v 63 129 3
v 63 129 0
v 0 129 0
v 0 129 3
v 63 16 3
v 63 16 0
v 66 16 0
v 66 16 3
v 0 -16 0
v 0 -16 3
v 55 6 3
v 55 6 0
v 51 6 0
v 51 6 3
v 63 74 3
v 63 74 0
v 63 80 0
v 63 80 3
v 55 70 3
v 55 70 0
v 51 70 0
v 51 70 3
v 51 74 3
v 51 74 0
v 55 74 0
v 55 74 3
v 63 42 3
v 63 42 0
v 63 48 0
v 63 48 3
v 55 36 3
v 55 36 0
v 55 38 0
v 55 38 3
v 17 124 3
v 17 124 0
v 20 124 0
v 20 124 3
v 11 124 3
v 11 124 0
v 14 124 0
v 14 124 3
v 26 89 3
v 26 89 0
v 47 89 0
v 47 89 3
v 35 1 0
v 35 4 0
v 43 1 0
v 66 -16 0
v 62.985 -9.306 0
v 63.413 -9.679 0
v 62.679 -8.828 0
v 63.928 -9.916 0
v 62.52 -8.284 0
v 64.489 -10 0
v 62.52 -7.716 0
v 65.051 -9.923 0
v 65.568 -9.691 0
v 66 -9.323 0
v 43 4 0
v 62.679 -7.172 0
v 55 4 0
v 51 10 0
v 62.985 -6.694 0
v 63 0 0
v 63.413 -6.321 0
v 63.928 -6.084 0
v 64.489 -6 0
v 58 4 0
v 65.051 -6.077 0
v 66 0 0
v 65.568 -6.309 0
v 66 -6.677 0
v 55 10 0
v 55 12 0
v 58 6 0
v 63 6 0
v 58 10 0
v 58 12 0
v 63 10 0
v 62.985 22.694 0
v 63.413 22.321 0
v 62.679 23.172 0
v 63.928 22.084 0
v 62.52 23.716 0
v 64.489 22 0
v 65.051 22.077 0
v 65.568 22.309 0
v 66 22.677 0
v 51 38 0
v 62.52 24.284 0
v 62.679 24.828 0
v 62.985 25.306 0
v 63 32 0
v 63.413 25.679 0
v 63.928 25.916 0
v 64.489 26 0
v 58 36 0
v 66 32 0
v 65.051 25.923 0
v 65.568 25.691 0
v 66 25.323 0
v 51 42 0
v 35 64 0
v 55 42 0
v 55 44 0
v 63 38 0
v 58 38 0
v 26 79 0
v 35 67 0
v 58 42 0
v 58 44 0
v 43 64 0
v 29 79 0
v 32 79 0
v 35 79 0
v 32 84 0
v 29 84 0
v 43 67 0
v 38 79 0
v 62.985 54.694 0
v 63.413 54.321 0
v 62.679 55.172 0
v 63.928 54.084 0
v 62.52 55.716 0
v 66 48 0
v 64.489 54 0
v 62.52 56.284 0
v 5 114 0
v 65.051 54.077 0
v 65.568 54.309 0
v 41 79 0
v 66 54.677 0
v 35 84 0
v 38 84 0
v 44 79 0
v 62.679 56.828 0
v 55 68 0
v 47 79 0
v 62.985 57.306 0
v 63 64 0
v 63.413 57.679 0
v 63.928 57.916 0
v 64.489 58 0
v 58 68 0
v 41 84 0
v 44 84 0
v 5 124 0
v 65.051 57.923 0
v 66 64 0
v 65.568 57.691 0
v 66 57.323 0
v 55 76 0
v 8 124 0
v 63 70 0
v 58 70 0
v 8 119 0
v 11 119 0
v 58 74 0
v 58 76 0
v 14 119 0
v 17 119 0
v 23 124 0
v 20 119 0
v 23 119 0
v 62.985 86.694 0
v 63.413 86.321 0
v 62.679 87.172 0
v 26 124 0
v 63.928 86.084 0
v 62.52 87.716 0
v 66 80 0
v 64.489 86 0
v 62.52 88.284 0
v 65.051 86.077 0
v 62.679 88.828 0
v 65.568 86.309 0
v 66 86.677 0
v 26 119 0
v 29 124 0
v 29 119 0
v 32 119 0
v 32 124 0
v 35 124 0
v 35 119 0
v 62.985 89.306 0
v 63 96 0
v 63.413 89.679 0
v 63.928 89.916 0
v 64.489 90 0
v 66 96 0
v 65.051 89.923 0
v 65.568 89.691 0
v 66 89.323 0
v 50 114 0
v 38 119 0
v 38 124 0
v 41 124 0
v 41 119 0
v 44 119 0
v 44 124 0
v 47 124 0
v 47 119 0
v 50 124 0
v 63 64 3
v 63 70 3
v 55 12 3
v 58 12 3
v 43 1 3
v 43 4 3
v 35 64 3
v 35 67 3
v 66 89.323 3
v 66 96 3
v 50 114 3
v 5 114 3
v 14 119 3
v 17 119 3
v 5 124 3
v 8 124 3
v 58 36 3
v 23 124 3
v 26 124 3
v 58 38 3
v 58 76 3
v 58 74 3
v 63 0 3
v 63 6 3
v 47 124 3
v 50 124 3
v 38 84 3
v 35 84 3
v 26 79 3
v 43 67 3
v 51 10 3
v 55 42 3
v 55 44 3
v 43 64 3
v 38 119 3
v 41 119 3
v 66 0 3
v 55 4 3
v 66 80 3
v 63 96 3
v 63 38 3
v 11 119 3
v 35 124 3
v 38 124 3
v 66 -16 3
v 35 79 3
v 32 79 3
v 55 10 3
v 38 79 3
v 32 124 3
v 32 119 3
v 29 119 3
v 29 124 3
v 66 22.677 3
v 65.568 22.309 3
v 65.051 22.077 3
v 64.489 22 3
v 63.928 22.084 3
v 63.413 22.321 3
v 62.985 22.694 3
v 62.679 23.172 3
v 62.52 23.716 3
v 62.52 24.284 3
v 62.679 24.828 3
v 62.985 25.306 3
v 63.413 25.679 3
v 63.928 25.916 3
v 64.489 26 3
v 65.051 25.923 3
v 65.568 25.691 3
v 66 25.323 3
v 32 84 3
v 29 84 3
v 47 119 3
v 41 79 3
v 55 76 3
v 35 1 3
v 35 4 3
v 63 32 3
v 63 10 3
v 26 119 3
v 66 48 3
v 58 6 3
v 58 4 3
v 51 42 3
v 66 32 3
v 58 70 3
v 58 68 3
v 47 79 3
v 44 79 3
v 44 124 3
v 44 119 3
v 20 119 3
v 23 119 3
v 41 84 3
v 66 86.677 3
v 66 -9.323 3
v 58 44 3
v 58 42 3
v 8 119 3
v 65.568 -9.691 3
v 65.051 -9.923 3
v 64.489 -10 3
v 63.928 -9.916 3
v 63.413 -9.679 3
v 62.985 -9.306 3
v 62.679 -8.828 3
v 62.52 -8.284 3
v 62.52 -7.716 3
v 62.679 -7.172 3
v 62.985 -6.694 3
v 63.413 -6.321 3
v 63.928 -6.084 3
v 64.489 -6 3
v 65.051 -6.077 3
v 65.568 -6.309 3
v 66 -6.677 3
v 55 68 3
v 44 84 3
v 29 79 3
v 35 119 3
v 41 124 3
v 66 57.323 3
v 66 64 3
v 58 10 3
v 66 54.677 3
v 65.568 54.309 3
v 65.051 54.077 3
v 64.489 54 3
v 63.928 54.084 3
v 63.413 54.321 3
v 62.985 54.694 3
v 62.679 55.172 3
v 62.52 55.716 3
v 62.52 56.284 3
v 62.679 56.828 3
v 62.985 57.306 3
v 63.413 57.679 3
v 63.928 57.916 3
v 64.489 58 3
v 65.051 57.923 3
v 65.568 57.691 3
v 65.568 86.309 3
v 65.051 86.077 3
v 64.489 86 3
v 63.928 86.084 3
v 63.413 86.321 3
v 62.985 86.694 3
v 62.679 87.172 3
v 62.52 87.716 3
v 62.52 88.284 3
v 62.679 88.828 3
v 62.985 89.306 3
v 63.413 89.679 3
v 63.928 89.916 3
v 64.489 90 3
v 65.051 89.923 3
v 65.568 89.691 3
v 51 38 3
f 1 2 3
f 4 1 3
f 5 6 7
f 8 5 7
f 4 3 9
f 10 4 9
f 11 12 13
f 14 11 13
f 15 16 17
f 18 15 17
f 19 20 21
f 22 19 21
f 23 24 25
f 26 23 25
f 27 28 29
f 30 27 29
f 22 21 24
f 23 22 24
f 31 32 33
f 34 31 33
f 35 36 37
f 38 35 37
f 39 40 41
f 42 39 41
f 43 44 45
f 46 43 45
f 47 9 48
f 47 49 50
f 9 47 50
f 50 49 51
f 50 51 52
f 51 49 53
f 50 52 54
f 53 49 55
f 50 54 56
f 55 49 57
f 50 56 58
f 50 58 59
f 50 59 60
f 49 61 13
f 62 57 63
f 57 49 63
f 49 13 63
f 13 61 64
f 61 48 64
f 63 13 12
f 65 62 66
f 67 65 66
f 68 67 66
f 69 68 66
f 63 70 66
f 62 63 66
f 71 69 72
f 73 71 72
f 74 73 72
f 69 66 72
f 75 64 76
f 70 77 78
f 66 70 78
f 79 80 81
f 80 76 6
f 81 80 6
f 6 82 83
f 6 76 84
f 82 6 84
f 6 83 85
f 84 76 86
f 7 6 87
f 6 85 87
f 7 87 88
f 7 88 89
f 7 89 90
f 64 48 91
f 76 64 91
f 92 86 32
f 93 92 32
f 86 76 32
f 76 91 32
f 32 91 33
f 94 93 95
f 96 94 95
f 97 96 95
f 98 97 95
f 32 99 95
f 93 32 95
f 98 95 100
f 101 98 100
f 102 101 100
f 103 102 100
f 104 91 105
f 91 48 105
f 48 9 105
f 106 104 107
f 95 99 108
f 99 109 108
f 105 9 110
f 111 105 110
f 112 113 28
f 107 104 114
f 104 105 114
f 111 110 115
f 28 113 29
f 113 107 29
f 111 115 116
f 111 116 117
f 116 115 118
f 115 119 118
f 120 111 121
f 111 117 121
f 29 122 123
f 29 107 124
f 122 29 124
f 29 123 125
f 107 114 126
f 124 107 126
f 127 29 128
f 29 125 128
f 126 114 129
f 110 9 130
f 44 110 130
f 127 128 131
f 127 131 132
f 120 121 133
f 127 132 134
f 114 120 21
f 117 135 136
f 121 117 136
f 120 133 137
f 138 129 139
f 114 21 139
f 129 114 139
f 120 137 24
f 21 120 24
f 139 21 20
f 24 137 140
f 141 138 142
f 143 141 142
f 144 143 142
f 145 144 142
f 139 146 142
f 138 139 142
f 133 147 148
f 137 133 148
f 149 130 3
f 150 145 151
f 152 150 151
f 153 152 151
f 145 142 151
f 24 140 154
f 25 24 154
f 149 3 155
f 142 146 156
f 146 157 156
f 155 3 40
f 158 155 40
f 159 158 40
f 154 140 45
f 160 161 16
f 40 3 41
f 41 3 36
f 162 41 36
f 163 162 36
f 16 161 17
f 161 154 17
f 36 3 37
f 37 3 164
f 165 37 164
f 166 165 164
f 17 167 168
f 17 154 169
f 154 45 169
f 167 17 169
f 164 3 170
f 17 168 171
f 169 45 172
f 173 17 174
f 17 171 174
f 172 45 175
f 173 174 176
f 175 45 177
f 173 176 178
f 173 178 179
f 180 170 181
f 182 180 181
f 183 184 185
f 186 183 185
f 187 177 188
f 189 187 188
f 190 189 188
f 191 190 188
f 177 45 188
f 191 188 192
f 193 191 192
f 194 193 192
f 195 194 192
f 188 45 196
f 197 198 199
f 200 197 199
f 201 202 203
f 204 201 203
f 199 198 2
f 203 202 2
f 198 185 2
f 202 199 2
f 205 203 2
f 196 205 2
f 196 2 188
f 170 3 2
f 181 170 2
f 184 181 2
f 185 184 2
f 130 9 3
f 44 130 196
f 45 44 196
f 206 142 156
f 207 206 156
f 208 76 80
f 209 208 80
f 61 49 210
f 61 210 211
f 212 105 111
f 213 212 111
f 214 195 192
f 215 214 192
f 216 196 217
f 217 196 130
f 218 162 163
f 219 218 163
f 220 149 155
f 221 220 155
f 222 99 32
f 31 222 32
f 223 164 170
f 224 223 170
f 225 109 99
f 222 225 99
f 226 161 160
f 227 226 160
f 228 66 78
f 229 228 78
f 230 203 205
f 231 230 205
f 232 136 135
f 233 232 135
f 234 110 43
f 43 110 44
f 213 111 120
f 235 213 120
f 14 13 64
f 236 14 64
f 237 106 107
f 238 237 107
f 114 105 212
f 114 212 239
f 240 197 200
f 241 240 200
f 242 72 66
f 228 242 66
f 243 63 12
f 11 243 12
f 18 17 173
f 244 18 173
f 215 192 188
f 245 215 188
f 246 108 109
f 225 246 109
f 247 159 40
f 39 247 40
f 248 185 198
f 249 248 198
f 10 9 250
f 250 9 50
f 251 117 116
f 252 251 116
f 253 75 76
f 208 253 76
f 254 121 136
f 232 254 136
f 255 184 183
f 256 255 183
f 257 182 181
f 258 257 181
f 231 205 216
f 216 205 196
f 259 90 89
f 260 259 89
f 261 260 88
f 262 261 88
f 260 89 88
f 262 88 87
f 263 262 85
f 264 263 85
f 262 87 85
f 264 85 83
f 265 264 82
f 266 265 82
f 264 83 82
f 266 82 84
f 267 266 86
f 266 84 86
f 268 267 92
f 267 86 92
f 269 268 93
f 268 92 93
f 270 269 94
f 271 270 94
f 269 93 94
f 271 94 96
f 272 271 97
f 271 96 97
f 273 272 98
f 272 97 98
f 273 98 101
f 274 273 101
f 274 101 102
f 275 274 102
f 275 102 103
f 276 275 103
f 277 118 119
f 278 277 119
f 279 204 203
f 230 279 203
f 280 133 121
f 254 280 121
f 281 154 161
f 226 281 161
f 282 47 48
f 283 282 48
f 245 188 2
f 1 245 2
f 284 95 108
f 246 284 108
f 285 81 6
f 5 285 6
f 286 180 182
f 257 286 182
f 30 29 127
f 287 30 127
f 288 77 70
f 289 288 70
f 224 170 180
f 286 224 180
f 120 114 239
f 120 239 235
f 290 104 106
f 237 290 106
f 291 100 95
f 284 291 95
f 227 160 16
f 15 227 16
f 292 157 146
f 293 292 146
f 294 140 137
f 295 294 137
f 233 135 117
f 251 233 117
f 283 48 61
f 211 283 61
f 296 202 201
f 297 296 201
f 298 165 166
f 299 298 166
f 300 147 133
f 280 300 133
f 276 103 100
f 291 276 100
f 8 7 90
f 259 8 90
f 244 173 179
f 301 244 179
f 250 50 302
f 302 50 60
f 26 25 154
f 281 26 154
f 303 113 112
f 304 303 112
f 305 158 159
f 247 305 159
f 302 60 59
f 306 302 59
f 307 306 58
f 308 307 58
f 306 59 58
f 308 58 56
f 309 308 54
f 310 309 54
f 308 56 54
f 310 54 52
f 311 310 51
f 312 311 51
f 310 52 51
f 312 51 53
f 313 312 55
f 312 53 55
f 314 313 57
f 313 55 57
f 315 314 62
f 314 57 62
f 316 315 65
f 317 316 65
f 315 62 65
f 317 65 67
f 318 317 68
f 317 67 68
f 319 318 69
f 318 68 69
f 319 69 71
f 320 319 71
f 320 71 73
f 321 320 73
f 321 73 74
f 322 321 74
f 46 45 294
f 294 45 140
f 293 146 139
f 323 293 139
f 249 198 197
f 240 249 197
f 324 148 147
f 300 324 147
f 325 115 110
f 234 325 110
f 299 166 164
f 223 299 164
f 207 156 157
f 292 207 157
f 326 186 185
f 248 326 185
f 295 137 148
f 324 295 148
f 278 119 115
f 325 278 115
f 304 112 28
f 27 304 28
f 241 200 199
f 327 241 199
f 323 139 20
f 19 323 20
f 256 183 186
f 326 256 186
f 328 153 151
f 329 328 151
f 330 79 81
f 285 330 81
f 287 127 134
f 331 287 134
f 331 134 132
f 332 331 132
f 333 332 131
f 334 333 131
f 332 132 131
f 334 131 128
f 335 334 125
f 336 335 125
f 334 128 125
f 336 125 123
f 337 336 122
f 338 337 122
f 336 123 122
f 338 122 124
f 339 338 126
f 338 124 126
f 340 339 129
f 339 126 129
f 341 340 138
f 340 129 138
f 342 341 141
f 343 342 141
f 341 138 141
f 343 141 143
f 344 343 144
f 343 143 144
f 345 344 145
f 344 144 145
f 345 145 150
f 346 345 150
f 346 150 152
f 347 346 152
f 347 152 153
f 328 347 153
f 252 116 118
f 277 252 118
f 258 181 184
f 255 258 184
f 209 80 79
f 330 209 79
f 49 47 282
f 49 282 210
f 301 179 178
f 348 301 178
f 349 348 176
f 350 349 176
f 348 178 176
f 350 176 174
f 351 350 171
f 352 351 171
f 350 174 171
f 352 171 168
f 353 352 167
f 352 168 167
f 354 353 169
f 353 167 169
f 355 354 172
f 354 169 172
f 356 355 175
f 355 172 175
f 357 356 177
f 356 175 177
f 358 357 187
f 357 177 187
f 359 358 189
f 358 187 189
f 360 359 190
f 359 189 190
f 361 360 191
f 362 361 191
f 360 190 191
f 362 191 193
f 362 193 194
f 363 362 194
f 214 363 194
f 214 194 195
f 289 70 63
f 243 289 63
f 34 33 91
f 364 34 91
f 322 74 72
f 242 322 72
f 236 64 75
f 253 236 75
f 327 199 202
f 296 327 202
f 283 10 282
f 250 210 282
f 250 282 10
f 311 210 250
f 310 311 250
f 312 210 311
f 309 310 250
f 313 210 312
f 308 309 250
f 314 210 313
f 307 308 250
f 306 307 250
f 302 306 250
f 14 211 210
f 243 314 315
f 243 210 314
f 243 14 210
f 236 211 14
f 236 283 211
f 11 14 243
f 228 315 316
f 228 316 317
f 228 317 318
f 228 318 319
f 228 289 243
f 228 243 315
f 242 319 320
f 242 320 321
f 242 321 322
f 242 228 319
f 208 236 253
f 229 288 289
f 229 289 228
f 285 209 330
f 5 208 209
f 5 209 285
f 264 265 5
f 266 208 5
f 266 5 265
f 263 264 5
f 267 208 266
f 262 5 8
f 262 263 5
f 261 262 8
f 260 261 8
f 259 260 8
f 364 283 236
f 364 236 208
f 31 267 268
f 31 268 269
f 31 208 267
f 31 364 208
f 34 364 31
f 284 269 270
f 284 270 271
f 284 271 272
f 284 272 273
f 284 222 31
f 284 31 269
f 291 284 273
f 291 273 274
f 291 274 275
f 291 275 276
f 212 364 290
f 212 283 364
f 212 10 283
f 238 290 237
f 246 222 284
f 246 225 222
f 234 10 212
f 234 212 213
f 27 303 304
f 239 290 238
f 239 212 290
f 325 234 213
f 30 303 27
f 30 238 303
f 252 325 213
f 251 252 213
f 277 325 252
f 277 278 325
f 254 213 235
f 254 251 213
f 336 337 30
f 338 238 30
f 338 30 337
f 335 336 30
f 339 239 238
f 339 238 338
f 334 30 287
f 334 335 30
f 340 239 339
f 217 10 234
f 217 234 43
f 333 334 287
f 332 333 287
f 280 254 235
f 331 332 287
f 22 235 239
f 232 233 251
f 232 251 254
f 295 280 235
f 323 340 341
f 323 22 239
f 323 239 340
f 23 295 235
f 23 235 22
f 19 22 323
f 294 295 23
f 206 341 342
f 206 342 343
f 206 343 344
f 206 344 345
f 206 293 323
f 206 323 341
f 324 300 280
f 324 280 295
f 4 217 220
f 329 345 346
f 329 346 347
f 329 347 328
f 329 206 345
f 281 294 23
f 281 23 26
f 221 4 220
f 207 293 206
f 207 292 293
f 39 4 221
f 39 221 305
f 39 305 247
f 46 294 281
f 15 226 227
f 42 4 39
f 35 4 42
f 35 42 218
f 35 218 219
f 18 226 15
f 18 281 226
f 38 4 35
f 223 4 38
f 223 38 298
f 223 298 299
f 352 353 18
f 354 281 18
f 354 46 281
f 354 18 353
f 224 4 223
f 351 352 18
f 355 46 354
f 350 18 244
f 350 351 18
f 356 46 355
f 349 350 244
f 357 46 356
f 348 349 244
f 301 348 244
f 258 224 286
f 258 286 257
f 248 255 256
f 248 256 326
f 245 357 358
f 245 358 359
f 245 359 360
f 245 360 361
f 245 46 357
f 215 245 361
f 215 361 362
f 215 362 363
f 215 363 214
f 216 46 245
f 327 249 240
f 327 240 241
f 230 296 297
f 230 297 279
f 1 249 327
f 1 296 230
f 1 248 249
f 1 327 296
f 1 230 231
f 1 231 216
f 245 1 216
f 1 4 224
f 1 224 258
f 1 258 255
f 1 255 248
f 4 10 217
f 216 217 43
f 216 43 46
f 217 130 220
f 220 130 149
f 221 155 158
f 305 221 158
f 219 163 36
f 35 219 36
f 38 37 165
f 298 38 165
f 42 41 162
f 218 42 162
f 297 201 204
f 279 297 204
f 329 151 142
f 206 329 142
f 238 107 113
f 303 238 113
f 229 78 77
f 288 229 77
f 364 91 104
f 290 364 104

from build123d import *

# Parameters (mm, degrees)
SKETCH_1_W      = 8
SKETCH_1_H      = 3
EXTRUDE_1_DEPTH = 3


with BuildPart() as part:
    # 草图1 → 凸台-拉伸1 (new body)
    with BuildSketch(Plane.XY):
        with BuildLine():
            Line((63, 10), (63, 16))
            Line((63, 16), (66, 16))
            Line((66, 16), (66, 22.677124344))
            ThreePointArc((66, 22.677124344), (62.5, 24), (66, 25.322875656))
            Line((66, 25.322875656), (66, 32))
            Line((66, 32), (63, 32))
            Line((63, 32), (63, 38))
            Line((63, 38), (58, 38))
            Line((58, 38), (58, 36))
            Line((58, 36), (55, 36))
            Line((55, 36), (55, 38))
            Line((55, 38), (51, 38))
            Line((51, 38), (51, 42))
            Line((51, 42), (55, 42))
            Line((55, 42), (55, 44))
            Line((55, 44), (58, 44))
            Line((58, 44), (58, 42))
            Line((58, 42), (63, 42))
            Line((63, 42), (63, 48))
            Line((63, 48), (66, 48))
            Line((66, 48), (66, 54.677124344))
            ThreePointArc((66, 54.677124344), (62.5, 56), (66, 57.322875656))
            Line((66, 57.322875656), (66, 64))
            Line((66, 64), (63, 64))
            Line((63, 64), (63, 70))
            Line((63, 70), (58, 70))
            Line((58, 70), (58, 68))
            Line((58, 68), (55, 68))
            Line((55, 68), (55, 70))
            Line((55, 70), (51, 70))
            Line((51, 70), (51, 74))
            Line((51, 74), (55, 74))
            Line((55, 74), (55, 76))
            Line((55, 76), (58, 76))
            Line((58, 76), (58, 74))
            Line((58, 74), (63, 74))
            Line((63, 74), (63, 80))
            Line((63, 80), (66, 80))
            Line((66, 80), (66, 86.677124344))
            ThreePointArc((66, 86.677124344), (62.5, 88), (66, 89.322875656))
            Line((66, 89.322875656), (66, 96))
            Line((66, 96), (63, 96))
            Line((63, 96), (63, 129))
            Line((63, 129), (0, 129))
            Line((0, 129), (0, 0))
            Line((0, 0), (0, -16))
            Line((0, -16), (66, -16))
            Line((66, -16), (66, -9.322875656))
            ThreePointArc((66, -9.322875656), (62.5, -8), (66, -6.677124344))
            Line((66, -6.677124344), (66, 0))
            Line((66, 0), (63, 0))
            Line((63, 0), (63, 6))
            Line((63, 6), (58, 6))
            Line((58, 6), (58, 4))
            Line((58, 4), (55, 4))
            Line((55, 4), (55, 6))
            Line((55, 6), (51, 6))
            Line((51, 6), (51, 10))
            Line((51, 10), (55, 10))
            Line((55, 10), (55, 12))
            Line((55, 12), (58, 12))
            Line((58, 12), (58, 10))
            Line((58, 10), (63, 10))
        make_face()
        with Locations((39, 2.5)):
            Rectangle(SKETCH_1_W, SKETCH_1_H, mode=Mode.SUBTRACT)
        with Locations((39, 65.5)):
            Rectangle(SKETCH_1_W, SKETCH_1_H, mode=Mode.SUBTRACT)
        Polygon((47, 89), (47, 84), (47, 79), (44, 79), (44, 84), (41, 84), (41, 79), (38, 79), (38, 84), (35, 84), (35, 79), (32, 79), (32, 84), (29, 84), (29, 79), (26, 79), (26, 89), (32, 89), align=None, mode=Mode.SUBTRACT)
        Polygon((5, 114), (5, 124), (8, 124), (8, 119), (11, 119), (11, 124), (14, 124), (14, 119), (17, 119), (17, 124), (20, 124), (20, 119), (23, 119), (23, 124), (26, 124), (26, 119), (29, 119), (29, 124), (32, 124), (32, 119), (35, 119), (35, 124), (38, 124), (38, 119), (41, 119), (41, 124), (44, 124), (44, 119), (47, 119), (47, 124), (50, 124), (50, 114), align=None, mode=Mode.SUBTRACT)
    extrude(amount=EXTRUDE_1_DEPTH)


solid = part.part
